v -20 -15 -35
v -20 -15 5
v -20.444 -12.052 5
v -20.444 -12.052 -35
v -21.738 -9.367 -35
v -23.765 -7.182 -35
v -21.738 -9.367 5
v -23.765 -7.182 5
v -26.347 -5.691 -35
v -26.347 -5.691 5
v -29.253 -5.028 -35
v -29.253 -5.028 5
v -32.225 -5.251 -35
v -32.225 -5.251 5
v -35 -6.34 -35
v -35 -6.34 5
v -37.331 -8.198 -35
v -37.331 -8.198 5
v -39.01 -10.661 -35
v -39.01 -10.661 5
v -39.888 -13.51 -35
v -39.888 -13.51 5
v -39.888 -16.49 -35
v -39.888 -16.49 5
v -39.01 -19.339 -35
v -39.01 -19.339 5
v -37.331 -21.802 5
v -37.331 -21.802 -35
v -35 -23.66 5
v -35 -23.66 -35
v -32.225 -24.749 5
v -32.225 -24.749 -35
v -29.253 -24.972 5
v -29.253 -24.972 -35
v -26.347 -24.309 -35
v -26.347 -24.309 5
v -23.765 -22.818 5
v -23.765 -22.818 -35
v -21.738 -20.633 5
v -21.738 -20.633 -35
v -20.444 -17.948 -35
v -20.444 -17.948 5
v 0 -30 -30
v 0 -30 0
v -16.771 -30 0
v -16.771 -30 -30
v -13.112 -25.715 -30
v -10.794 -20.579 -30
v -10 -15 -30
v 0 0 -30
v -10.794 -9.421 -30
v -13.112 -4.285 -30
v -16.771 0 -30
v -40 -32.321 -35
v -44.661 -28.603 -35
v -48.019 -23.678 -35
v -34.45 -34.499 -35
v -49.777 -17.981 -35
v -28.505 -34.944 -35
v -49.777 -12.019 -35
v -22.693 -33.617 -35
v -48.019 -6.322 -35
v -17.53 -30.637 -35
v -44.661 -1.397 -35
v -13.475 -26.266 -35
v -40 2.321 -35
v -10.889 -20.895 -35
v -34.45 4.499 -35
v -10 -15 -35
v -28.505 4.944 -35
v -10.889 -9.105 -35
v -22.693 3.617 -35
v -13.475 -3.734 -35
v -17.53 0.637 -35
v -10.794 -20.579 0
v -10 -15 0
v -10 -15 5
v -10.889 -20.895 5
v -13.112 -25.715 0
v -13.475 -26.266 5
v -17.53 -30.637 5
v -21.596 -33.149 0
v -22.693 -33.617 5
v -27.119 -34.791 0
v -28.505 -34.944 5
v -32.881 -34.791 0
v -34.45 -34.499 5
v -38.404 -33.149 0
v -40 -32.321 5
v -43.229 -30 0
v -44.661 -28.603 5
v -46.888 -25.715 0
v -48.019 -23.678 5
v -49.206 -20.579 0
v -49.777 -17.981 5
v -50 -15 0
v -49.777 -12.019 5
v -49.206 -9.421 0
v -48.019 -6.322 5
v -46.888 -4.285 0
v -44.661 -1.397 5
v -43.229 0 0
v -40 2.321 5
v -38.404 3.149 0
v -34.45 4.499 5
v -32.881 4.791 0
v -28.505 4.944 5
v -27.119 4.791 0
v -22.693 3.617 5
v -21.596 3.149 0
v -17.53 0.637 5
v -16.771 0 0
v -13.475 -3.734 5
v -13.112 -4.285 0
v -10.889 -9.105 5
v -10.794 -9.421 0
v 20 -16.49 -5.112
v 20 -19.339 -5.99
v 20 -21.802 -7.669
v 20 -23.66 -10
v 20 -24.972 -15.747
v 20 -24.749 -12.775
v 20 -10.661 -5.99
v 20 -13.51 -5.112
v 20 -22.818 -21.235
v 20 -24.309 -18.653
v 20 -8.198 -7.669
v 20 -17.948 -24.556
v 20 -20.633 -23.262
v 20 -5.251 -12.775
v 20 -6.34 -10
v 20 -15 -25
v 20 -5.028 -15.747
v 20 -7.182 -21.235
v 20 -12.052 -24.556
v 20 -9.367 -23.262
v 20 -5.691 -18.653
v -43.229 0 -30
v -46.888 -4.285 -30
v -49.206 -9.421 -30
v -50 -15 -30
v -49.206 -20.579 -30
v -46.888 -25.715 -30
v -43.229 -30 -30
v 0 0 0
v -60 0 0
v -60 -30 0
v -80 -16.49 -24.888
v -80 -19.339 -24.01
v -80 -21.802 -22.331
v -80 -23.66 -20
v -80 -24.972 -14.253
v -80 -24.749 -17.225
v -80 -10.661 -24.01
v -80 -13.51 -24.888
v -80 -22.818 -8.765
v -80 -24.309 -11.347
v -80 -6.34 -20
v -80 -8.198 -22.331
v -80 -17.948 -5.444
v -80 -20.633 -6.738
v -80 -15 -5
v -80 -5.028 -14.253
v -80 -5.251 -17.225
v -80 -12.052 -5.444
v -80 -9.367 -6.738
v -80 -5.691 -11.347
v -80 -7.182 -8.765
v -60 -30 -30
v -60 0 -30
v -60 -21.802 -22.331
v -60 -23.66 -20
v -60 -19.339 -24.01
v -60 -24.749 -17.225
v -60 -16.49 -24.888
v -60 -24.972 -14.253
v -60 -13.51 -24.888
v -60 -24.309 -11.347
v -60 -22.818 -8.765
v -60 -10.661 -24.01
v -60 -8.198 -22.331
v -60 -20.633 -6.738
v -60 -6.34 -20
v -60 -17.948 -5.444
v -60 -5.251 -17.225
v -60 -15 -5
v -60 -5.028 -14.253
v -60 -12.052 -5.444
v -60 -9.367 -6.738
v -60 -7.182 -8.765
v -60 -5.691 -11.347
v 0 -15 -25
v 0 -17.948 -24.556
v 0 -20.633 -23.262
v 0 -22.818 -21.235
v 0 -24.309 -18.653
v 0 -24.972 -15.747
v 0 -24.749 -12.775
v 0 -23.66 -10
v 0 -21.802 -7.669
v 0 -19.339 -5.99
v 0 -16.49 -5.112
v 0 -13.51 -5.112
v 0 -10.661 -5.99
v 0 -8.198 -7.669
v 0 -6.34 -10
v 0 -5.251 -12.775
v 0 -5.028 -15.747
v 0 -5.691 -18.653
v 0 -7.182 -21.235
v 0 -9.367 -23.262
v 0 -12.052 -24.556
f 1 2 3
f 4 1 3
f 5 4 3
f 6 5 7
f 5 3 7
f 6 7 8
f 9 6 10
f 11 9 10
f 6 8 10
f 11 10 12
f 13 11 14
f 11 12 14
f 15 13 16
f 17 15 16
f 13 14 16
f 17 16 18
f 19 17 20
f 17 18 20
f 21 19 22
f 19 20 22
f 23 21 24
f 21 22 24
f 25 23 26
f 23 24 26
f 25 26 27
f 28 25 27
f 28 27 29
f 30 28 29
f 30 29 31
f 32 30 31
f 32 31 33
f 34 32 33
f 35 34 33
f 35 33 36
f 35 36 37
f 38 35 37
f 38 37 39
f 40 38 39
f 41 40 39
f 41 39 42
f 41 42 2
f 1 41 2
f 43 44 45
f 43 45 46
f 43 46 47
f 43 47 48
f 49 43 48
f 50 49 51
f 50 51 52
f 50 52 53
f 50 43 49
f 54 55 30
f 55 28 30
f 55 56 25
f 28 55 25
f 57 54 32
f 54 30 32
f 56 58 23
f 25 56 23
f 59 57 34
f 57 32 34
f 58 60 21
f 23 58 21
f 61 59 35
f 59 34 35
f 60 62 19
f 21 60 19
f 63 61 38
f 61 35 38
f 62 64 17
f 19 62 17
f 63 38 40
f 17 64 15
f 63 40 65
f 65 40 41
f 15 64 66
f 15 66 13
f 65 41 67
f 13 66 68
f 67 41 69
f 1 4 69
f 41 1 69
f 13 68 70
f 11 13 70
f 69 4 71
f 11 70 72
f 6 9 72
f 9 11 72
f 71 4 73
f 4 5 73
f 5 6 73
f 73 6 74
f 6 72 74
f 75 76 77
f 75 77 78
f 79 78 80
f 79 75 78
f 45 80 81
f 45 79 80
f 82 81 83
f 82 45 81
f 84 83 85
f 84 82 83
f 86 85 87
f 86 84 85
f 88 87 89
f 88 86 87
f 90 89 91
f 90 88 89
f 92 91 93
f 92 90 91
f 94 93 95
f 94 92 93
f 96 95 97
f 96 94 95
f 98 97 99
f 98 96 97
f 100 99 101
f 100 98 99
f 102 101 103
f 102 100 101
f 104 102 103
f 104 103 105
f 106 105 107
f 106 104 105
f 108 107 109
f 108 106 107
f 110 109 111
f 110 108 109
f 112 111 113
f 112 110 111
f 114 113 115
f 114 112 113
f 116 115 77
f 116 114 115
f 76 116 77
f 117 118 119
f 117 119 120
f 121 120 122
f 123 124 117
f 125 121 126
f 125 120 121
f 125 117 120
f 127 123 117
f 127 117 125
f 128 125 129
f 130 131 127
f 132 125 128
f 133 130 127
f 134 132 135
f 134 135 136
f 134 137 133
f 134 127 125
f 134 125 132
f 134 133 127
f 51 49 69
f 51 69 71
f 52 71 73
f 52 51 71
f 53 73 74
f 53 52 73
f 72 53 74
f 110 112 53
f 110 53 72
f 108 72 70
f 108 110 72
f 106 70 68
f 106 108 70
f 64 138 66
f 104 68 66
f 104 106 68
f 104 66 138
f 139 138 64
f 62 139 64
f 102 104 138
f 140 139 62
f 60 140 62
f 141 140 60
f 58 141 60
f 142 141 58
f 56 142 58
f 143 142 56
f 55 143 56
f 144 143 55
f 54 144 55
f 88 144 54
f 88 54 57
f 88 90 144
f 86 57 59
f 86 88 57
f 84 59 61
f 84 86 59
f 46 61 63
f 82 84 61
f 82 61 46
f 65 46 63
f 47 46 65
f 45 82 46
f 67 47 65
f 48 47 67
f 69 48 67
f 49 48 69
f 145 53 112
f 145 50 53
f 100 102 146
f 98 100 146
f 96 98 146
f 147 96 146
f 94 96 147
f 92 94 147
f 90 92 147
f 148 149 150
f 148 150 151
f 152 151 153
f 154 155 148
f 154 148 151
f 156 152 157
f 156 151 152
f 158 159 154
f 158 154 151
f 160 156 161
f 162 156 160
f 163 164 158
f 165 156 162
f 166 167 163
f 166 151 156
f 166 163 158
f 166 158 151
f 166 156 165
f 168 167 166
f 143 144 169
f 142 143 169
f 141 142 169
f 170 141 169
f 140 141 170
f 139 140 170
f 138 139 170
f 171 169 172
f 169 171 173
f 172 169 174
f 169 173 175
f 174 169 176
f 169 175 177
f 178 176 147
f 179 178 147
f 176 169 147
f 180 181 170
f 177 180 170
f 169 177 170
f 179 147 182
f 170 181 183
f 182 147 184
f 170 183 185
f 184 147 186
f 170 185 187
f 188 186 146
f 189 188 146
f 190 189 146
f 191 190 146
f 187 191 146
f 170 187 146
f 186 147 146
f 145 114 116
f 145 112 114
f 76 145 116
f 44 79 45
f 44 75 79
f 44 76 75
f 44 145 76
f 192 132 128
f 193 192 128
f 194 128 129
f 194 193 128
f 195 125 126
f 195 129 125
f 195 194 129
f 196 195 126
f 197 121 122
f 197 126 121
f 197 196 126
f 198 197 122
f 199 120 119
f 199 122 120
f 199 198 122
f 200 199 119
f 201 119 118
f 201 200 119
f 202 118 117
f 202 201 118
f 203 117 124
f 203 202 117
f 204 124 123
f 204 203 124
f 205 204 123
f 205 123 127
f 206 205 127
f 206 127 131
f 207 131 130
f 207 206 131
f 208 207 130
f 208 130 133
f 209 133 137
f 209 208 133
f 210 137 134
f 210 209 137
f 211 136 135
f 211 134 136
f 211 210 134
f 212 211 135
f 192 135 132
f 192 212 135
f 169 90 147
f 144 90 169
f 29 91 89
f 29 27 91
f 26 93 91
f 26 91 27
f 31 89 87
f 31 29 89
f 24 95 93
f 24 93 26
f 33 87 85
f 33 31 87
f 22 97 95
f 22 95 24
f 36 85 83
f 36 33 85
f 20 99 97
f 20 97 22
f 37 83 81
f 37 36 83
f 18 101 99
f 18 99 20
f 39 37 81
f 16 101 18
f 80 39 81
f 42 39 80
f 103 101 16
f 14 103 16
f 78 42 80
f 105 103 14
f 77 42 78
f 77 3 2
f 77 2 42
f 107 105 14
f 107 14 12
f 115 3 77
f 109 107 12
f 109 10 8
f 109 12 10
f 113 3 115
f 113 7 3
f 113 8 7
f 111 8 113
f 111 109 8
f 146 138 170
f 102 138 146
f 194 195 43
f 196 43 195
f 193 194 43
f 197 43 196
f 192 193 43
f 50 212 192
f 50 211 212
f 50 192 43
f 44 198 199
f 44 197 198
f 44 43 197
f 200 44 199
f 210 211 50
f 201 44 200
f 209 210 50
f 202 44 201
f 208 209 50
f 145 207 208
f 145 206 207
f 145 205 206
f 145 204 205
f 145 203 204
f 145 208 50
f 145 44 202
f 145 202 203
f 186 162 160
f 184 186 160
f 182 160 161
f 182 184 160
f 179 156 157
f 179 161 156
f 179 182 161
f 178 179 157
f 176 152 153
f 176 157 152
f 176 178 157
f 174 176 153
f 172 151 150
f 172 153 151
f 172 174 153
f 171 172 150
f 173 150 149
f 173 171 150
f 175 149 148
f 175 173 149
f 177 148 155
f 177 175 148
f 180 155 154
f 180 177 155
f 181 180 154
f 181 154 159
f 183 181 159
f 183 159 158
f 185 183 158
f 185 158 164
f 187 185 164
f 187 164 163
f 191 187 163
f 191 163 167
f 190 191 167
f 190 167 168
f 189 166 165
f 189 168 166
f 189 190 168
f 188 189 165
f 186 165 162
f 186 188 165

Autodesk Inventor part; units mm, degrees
ref_plane "YZ Plane" through (0, 0, 0) normal (1, 0, 0) x (0, 1, 0)
ref_plane "XZ Plane" through (0, 0, 0) normal (0, 1, 0) x (-1, 0, 0)
ref_plane "XY Plane" through (0, 0, 0) normal (0, 0, 1) x (1, 0, 0)
sketch "Náčrt1" plane through (0, 0, 0) normal (0, 0, 1) x (1, 0, 0)
  point P0 (0, 0)
sketch "Náčrt2" plane through (0, 0, 0) normal (0, 0, 1) x (1, 0, 0)
  point P0 (0, 0)
sketch "Náčrt3" plane through (0, 0, 0) normal (1, 0, 0) x (0, 1, 0)
  line L0 (0, 0) -> (-30, 0)
  line L1 (-30, 0) -> (-30, -30)
  line L2 (-30, -30) -> (0, -30)
  line L3 (0, -30) -> (0, 0)
  dimension "d0" = 30
  dimension "d1" = 30
extrude "Vysunutí1" add sketch "Náčrt3" against normal blind 60
sketch "Náčrt4" plane through (0, -30, 0) normal (0, 0, 1) x (1, 0, 0)
  circle A0 centre (-30, 15) radius 20
  point P0 (0, 30)
  dimension "d4" = 40
extrude "Vysunutí2" add sketch "Náčrt4" along normal blind 5 and the other way blind 35
sketch "Náčrt5" plane through (-30, -15, 5) normal (0, 0, 1) x (1, 0, 0)
  circle A0 centre (0, 0) radius 10
  point P0 (30, 15)
  dimension "d9" = 20
extrude "Vysunutí3" cut sketch "Náčrt5" against normal through all
sketch "Náčrt6" plane through (0, 0, 0) normal (1, 0, 0) x (0, 0, -1)
  circle A0 centre (15, -15) radius 10
  point P0 (0, 0)
  dimension "d12" = 20
extrude "Vysunutí4" add sketch "Náčrt6" along normal blind 20
sketch "Náčrt7" plane through (-60, 0, 0) normal (-1, 0, 0) x (0, 0, 1)
  circle A0 centre (-15, -15) radius 10
  point P0 (0, 0)
  dimension "d15" = 20
extrude "Vysunutí5" add sketch "Náčrt7" along normal blind 20
properties part number "12"
